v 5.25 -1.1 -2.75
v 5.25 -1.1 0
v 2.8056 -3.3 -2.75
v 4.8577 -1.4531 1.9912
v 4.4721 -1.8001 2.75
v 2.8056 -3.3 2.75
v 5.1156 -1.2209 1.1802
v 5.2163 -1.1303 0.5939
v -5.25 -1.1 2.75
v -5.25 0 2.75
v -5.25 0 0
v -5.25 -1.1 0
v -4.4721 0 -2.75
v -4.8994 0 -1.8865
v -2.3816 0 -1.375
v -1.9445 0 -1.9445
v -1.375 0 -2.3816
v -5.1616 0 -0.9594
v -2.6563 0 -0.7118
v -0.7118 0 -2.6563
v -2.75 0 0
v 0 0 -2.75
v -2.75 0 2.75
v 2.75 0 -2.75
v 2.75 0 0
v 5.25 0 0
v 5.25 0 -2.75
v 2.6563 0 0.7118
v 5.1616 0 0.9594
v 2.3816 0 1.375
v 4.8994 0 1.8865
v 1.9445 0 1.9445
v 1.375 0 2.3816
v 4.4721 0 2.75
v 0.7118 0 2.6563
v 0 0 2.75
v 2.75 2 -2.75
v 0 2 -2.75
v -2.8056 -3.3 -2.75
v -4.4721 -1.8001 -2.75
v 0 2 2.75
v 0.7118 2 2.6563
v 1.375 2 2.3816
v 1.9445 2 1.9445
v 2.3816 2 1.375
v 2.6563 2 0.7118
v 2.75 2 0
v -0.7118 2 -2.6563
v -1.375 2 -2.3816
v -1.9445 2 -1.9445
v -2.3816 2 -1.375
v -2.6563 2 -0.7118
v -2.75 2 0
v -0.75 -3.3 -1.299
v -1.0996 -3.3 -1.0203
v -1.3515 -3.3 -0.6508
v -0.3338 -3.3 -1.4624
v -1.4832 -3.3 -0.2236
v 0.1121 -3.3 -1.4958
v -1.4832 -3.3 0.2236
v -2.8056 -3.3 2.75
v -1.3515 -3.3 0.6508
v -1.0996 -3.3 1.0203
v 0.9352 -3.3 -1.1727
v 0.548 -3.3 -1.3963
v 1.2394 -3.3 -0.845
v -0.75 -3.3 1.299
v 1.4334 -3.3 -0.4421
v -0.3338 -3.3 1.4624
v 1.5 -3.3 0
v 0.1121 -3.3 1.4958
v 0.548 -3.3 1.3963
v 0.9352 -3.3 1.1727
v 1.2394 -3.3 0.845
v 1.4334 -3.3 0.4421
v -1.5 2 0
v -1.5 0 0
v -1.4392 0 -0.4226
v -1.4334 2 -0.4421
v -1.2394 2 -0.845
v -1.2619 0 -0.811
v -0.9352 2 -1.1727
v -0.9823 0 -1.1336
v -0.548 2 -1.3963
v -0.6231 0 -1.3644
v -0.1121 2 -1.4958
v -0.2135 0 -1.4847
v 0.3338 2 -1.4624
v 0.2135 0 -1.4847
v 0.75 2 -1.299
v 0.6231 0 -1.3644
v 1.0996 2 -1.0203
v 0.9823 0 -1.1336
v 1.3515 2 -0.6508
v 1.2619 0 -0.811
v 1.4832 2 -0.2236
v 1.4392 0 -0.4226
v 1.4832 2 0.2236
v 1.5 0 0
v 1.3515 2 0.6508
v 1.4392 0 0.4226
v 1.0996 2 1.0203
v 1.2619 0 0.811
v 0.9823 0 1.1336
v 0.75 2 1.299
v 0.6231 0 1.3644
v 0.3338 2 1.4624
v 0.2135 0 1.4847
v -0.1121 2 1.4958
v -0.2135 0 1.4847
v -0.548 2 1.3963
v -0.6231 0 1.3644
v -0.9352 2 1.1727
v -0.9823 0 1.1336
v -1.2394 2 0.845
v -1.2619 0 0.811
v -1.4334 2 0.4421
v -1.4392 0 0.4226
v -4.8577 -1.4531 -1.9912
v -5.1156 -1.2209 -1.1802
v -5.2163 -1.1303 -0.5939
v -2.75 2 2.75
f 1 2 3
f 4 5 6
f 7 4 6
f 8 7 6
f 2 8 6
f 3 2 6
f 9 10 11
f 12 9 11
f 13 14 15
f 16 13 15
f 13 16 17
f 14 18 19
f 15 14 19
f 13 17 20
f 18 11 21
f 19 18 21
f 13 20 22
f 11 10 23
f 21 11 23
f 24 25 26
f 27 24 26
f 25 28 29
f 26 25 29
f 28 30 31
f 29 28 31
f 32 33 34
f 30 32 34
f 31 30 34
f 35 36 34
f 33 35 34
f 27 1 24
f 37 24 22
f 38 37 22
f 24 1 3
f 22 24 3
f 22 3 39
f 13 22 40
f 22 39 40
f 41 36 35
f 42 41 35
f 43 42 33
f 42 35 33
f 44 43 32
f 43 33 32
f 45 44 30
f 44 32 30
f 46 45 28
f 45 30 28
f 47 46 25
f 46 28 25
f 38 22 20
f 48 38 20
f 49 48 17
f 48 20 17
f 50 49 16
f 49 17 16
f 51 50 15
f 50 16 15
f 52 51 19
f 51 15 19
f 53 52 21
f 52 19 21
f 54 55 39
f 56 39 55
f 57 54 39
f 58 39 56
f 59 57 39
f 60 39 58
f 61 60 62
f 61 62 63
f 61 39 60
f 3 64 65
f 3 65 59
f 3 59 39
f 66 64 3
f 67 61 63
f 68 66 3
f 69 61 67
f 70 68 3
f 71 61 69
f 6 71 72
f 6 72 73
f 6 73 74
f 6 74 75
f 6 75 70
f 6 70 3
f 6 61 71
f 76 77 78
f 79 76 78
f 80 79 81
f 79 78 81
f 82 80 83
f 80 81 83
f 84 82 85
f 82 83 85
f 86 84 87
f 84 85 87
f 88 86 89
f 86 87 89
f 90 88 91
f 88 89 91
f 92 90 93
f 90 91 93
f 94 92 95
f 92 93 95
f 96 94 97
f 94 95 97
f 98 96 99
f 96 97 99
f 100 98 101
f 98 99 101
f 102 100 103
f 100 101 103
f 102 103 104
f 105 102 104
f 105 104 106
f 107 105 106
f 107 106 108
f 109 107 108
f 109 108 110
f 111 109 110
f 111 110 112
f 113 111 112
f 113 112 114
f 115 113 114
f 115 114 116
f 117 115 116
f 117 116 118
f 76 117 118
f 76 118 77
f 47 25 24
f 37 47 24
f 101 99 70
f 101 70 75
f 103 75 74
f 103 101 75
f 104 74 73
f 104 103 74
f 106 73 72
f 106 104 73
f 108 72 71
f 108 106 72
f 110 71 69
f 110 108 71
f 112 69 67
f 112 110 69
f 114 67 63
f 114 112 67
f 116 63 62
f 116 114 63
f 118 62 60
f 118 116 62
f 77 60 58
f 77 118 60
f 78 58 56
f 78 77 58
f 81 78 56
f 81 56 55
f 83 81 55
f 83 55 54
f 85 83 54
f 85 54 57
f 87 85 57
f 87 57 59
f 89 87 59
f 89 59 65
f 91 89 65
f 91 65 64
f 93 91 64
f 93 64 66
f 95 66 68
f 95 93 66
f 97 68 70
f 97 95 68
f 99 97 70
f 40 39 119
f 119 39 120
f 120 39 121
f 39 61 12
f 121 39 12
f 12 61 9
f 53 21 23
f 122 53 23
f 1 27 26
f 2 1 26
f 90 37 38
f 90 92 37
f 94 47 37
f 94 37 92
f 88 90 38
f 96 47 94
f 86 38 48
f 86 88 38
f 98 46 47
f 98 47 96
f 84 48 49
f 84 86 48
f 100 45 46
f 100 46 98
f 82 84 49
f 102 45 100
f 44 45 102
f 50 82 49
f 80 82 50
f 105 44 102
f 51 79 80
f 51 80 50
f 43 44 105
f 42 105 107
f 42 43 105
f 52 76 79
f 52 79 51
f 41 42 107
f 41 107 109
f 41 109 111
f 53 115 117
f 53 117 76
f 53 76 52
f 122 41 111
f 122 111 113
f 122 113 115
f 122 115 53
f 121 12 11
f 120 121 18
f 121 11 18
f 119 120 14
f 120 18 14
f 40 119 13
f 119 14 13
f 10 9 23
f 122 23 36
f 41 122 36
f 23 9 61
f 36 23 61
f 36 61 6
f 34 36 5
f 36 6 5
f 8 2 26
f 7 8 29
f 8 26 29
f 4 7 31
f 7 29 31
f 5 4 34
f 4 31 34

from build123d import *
from build123d import SkipClean  # not in build123d's __all__

# Parameters (mm, degrees)
F0_R     = 1.5
F1_DEPTH = 3.8
F3_DEPTH = 2
F5_DEPTH = 25
F6_W     = 5.9742073228
F6_H     = 0.5
F7_DEPTH = 25


# Not quite as in the source:
# - after a boolean that leaves OpenCascade's solid faulty, fix() repairs it


with BuildPart() as f1:
    # F0 (on Front) → F1 (new body)
    with BuildSketch(Plane.XZ):
        with BuildLine():
            Line((-4.472135955, -2.75), (4.472135955, -2.75))
            ThreePointArc((4.472135955, -2.75), (5.0517924425, -1.4289482559), (5.25, 0))
            ThreePointArc((5.25, 0), (5.0517924425, 1.4289482559), (4.472135955, 2.75))
            Line((4.472135955, 2.75), (-4.472135955, 2.75))
            ThreePointArc((-4.472135955, 2.75), (-5.0517924425, 1.4289482559), (-5.25, 0))
            ThreePointArc((-5.25, 0), (-5.0517924425, -1.4289482559), (-4.472135955, -2.75))
        make_face()
        Circle(F0_R, mode=Mode.SUBTRACT)
        with BuildLine():
            Line((-5.25, 2.75), (-5.25, 0))
            ThreePointArc((-5.25, 0), (-5.0517924425, 1.4289482559), (-4.472135955, 2.75))
            Line((-4.472135955, 2.75), (-5.25, 2.75))
        make_face()
        with BuildLine():
            Line((4.472135955, -2.75), (5.25, -2.75))
            Line((5.25, -2.75), (5.25, 0))
            ThreePointArc((5.25, 0), (5.0517924425, -1.4289482559), (4.472135955, -2.75))
        make_face()
    extrude(amount=F1_DEPTH)

    # F2 (on face) → F3 (join)
    with BuildSketch(Plane(origin=(0, 0, 0), x_dir=(-1, 0, 0), z_dir=(0, 1, 0))):
        with BuildLine():
            Line((1.5, 0), (2.75, 0))
            ThreePointArc((2.75, 0), (1.9445436483, 1.9445436483), (0, 2.75))
            ThreePointArc((0, 2.75), (-1.9445436483, 1.9445436483), (-2.75, 0))
            Line((-2.75, 0), (-1.5, 0))
            ThreePointArc((-1.5, 0), (0, 1.5), (1.5, 0))
        make_face()
        with BuildLine():
            ThreePointArc((0, -2.75), (1.9445436483, -1.9445436483), (2.75, 0))
            Line((2.75, 0), (1.5, 0))
            ThreePointArc((1.5, 0), (0, -1.5), (-1.5, 0))
            Line((-1.5, 0), (-2.75, 0))
            ThreePointArc((-2.75, 0), (-1.9445436483, -1.9445436483), (0, -2.75))
        make_face()
        with BuildLine():
            ThreePointArc((0, 2.75), (1.9445436483, 1.9445436483), (2.75, 0))
            Line((2.75, 0), (2.75, 2.75))
            Line((2.75, 2.75), (0, 2.75))
        make_face()
        with BuildLine():
            Line((-2.75, -2.75), (0, -2.75))
            ThreePointArc((0, -2.75), (-1.9445436483, -1.9445436483), (-2.75, 0))
            Line((-2.75, 0), (-2.75, -2.75))
        make_face()
    with SkipClean():  # cleaning this boolean's faces spoils the solid; the shape is the same uncleaned
        extrude(amount=F3_DEPTH)

    # F4 (on face) → F5 (cut)
    with BuildSketch(Plane.XY.offset(2.75)):
        Polygon((-5.25, -1.1), (-5.25, -3.8), (-2.25, -3.8), align=None)
        Polygon((2.25, -3.8), (5.25, -3.8), (5.25, -1.1), align=None)
    extrude(amount=-F5_DEPTH, mode=Mode.SUBTRACT)

    add(f1.part.fix(), mode=Mode.REPLACE)

    # F6 (on face) → F7 (cut)
    with BuildSketch(Plane.XY.offset(2.75)):
        with Locations((-0.0664879346, -3.55)):
            Rectangle(F6_W, F6_H)
    extrude(amount=-F7_DEPTH, mode=Mode.SUBTRACT)


solid = f1.part
